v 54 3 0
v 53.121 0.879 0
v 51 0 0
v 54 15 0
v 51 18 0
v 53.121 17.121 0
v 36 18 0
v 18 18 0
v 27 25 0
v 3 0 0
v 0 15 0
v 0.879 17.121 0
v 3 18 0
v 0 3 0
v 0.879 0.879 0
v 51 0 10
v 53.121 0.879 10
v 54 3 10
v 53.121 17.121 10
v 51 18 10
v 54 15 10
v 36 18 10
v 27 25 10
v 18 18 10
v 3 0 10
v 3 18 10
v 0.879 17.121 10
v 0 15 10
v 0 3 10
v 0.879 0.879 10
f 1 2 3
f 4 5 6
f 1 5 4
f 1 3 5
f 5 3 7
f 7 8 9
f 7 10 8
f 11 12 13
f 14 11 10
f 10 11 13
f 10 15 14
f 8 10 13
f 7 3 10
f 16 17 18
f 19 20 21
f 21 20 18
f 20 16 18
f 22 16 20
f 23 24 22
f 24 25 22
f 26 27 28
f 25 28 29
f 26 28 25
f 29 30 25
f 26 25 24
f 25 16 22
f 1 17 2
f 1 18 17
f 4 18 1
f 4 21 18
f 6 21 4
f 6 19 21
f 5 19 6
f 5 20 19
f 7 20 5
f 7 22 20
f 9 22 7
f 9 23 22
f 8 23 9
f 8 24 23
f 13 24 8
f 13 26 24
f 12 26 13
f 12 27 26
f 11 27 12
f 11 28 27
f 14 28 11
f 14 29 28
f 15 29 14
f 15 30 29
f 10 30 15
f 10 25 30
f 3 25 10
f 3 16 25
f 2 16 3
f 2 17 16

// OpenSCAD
$fn = 32;

// ----------------------------------------------------------------------
// Ratchet pawl: 54 x 18 mm body, beak 7 mm сверху
// ----------------------------------------------------------------------

// --- parameters (mm) ---
profile_height = 10;      // extrusion height
profile_points = 15;      // points of the closed outline

profile = [[0, 3], [0.879, 0.879], [3, 0], [51, 0], [53.121, 0.879], [54, 3], [54, 15], [53.121, 17.121], [51, 18], [36, 18], [27, 25], [18, 18], [3, 18], [0.879, 17.121], [0, 15]];  // single closed polygon, 15 points, counter clockwise

// --- the one profile operation ---
linear_extrude(height = profile_height) polygon(points = profile);
